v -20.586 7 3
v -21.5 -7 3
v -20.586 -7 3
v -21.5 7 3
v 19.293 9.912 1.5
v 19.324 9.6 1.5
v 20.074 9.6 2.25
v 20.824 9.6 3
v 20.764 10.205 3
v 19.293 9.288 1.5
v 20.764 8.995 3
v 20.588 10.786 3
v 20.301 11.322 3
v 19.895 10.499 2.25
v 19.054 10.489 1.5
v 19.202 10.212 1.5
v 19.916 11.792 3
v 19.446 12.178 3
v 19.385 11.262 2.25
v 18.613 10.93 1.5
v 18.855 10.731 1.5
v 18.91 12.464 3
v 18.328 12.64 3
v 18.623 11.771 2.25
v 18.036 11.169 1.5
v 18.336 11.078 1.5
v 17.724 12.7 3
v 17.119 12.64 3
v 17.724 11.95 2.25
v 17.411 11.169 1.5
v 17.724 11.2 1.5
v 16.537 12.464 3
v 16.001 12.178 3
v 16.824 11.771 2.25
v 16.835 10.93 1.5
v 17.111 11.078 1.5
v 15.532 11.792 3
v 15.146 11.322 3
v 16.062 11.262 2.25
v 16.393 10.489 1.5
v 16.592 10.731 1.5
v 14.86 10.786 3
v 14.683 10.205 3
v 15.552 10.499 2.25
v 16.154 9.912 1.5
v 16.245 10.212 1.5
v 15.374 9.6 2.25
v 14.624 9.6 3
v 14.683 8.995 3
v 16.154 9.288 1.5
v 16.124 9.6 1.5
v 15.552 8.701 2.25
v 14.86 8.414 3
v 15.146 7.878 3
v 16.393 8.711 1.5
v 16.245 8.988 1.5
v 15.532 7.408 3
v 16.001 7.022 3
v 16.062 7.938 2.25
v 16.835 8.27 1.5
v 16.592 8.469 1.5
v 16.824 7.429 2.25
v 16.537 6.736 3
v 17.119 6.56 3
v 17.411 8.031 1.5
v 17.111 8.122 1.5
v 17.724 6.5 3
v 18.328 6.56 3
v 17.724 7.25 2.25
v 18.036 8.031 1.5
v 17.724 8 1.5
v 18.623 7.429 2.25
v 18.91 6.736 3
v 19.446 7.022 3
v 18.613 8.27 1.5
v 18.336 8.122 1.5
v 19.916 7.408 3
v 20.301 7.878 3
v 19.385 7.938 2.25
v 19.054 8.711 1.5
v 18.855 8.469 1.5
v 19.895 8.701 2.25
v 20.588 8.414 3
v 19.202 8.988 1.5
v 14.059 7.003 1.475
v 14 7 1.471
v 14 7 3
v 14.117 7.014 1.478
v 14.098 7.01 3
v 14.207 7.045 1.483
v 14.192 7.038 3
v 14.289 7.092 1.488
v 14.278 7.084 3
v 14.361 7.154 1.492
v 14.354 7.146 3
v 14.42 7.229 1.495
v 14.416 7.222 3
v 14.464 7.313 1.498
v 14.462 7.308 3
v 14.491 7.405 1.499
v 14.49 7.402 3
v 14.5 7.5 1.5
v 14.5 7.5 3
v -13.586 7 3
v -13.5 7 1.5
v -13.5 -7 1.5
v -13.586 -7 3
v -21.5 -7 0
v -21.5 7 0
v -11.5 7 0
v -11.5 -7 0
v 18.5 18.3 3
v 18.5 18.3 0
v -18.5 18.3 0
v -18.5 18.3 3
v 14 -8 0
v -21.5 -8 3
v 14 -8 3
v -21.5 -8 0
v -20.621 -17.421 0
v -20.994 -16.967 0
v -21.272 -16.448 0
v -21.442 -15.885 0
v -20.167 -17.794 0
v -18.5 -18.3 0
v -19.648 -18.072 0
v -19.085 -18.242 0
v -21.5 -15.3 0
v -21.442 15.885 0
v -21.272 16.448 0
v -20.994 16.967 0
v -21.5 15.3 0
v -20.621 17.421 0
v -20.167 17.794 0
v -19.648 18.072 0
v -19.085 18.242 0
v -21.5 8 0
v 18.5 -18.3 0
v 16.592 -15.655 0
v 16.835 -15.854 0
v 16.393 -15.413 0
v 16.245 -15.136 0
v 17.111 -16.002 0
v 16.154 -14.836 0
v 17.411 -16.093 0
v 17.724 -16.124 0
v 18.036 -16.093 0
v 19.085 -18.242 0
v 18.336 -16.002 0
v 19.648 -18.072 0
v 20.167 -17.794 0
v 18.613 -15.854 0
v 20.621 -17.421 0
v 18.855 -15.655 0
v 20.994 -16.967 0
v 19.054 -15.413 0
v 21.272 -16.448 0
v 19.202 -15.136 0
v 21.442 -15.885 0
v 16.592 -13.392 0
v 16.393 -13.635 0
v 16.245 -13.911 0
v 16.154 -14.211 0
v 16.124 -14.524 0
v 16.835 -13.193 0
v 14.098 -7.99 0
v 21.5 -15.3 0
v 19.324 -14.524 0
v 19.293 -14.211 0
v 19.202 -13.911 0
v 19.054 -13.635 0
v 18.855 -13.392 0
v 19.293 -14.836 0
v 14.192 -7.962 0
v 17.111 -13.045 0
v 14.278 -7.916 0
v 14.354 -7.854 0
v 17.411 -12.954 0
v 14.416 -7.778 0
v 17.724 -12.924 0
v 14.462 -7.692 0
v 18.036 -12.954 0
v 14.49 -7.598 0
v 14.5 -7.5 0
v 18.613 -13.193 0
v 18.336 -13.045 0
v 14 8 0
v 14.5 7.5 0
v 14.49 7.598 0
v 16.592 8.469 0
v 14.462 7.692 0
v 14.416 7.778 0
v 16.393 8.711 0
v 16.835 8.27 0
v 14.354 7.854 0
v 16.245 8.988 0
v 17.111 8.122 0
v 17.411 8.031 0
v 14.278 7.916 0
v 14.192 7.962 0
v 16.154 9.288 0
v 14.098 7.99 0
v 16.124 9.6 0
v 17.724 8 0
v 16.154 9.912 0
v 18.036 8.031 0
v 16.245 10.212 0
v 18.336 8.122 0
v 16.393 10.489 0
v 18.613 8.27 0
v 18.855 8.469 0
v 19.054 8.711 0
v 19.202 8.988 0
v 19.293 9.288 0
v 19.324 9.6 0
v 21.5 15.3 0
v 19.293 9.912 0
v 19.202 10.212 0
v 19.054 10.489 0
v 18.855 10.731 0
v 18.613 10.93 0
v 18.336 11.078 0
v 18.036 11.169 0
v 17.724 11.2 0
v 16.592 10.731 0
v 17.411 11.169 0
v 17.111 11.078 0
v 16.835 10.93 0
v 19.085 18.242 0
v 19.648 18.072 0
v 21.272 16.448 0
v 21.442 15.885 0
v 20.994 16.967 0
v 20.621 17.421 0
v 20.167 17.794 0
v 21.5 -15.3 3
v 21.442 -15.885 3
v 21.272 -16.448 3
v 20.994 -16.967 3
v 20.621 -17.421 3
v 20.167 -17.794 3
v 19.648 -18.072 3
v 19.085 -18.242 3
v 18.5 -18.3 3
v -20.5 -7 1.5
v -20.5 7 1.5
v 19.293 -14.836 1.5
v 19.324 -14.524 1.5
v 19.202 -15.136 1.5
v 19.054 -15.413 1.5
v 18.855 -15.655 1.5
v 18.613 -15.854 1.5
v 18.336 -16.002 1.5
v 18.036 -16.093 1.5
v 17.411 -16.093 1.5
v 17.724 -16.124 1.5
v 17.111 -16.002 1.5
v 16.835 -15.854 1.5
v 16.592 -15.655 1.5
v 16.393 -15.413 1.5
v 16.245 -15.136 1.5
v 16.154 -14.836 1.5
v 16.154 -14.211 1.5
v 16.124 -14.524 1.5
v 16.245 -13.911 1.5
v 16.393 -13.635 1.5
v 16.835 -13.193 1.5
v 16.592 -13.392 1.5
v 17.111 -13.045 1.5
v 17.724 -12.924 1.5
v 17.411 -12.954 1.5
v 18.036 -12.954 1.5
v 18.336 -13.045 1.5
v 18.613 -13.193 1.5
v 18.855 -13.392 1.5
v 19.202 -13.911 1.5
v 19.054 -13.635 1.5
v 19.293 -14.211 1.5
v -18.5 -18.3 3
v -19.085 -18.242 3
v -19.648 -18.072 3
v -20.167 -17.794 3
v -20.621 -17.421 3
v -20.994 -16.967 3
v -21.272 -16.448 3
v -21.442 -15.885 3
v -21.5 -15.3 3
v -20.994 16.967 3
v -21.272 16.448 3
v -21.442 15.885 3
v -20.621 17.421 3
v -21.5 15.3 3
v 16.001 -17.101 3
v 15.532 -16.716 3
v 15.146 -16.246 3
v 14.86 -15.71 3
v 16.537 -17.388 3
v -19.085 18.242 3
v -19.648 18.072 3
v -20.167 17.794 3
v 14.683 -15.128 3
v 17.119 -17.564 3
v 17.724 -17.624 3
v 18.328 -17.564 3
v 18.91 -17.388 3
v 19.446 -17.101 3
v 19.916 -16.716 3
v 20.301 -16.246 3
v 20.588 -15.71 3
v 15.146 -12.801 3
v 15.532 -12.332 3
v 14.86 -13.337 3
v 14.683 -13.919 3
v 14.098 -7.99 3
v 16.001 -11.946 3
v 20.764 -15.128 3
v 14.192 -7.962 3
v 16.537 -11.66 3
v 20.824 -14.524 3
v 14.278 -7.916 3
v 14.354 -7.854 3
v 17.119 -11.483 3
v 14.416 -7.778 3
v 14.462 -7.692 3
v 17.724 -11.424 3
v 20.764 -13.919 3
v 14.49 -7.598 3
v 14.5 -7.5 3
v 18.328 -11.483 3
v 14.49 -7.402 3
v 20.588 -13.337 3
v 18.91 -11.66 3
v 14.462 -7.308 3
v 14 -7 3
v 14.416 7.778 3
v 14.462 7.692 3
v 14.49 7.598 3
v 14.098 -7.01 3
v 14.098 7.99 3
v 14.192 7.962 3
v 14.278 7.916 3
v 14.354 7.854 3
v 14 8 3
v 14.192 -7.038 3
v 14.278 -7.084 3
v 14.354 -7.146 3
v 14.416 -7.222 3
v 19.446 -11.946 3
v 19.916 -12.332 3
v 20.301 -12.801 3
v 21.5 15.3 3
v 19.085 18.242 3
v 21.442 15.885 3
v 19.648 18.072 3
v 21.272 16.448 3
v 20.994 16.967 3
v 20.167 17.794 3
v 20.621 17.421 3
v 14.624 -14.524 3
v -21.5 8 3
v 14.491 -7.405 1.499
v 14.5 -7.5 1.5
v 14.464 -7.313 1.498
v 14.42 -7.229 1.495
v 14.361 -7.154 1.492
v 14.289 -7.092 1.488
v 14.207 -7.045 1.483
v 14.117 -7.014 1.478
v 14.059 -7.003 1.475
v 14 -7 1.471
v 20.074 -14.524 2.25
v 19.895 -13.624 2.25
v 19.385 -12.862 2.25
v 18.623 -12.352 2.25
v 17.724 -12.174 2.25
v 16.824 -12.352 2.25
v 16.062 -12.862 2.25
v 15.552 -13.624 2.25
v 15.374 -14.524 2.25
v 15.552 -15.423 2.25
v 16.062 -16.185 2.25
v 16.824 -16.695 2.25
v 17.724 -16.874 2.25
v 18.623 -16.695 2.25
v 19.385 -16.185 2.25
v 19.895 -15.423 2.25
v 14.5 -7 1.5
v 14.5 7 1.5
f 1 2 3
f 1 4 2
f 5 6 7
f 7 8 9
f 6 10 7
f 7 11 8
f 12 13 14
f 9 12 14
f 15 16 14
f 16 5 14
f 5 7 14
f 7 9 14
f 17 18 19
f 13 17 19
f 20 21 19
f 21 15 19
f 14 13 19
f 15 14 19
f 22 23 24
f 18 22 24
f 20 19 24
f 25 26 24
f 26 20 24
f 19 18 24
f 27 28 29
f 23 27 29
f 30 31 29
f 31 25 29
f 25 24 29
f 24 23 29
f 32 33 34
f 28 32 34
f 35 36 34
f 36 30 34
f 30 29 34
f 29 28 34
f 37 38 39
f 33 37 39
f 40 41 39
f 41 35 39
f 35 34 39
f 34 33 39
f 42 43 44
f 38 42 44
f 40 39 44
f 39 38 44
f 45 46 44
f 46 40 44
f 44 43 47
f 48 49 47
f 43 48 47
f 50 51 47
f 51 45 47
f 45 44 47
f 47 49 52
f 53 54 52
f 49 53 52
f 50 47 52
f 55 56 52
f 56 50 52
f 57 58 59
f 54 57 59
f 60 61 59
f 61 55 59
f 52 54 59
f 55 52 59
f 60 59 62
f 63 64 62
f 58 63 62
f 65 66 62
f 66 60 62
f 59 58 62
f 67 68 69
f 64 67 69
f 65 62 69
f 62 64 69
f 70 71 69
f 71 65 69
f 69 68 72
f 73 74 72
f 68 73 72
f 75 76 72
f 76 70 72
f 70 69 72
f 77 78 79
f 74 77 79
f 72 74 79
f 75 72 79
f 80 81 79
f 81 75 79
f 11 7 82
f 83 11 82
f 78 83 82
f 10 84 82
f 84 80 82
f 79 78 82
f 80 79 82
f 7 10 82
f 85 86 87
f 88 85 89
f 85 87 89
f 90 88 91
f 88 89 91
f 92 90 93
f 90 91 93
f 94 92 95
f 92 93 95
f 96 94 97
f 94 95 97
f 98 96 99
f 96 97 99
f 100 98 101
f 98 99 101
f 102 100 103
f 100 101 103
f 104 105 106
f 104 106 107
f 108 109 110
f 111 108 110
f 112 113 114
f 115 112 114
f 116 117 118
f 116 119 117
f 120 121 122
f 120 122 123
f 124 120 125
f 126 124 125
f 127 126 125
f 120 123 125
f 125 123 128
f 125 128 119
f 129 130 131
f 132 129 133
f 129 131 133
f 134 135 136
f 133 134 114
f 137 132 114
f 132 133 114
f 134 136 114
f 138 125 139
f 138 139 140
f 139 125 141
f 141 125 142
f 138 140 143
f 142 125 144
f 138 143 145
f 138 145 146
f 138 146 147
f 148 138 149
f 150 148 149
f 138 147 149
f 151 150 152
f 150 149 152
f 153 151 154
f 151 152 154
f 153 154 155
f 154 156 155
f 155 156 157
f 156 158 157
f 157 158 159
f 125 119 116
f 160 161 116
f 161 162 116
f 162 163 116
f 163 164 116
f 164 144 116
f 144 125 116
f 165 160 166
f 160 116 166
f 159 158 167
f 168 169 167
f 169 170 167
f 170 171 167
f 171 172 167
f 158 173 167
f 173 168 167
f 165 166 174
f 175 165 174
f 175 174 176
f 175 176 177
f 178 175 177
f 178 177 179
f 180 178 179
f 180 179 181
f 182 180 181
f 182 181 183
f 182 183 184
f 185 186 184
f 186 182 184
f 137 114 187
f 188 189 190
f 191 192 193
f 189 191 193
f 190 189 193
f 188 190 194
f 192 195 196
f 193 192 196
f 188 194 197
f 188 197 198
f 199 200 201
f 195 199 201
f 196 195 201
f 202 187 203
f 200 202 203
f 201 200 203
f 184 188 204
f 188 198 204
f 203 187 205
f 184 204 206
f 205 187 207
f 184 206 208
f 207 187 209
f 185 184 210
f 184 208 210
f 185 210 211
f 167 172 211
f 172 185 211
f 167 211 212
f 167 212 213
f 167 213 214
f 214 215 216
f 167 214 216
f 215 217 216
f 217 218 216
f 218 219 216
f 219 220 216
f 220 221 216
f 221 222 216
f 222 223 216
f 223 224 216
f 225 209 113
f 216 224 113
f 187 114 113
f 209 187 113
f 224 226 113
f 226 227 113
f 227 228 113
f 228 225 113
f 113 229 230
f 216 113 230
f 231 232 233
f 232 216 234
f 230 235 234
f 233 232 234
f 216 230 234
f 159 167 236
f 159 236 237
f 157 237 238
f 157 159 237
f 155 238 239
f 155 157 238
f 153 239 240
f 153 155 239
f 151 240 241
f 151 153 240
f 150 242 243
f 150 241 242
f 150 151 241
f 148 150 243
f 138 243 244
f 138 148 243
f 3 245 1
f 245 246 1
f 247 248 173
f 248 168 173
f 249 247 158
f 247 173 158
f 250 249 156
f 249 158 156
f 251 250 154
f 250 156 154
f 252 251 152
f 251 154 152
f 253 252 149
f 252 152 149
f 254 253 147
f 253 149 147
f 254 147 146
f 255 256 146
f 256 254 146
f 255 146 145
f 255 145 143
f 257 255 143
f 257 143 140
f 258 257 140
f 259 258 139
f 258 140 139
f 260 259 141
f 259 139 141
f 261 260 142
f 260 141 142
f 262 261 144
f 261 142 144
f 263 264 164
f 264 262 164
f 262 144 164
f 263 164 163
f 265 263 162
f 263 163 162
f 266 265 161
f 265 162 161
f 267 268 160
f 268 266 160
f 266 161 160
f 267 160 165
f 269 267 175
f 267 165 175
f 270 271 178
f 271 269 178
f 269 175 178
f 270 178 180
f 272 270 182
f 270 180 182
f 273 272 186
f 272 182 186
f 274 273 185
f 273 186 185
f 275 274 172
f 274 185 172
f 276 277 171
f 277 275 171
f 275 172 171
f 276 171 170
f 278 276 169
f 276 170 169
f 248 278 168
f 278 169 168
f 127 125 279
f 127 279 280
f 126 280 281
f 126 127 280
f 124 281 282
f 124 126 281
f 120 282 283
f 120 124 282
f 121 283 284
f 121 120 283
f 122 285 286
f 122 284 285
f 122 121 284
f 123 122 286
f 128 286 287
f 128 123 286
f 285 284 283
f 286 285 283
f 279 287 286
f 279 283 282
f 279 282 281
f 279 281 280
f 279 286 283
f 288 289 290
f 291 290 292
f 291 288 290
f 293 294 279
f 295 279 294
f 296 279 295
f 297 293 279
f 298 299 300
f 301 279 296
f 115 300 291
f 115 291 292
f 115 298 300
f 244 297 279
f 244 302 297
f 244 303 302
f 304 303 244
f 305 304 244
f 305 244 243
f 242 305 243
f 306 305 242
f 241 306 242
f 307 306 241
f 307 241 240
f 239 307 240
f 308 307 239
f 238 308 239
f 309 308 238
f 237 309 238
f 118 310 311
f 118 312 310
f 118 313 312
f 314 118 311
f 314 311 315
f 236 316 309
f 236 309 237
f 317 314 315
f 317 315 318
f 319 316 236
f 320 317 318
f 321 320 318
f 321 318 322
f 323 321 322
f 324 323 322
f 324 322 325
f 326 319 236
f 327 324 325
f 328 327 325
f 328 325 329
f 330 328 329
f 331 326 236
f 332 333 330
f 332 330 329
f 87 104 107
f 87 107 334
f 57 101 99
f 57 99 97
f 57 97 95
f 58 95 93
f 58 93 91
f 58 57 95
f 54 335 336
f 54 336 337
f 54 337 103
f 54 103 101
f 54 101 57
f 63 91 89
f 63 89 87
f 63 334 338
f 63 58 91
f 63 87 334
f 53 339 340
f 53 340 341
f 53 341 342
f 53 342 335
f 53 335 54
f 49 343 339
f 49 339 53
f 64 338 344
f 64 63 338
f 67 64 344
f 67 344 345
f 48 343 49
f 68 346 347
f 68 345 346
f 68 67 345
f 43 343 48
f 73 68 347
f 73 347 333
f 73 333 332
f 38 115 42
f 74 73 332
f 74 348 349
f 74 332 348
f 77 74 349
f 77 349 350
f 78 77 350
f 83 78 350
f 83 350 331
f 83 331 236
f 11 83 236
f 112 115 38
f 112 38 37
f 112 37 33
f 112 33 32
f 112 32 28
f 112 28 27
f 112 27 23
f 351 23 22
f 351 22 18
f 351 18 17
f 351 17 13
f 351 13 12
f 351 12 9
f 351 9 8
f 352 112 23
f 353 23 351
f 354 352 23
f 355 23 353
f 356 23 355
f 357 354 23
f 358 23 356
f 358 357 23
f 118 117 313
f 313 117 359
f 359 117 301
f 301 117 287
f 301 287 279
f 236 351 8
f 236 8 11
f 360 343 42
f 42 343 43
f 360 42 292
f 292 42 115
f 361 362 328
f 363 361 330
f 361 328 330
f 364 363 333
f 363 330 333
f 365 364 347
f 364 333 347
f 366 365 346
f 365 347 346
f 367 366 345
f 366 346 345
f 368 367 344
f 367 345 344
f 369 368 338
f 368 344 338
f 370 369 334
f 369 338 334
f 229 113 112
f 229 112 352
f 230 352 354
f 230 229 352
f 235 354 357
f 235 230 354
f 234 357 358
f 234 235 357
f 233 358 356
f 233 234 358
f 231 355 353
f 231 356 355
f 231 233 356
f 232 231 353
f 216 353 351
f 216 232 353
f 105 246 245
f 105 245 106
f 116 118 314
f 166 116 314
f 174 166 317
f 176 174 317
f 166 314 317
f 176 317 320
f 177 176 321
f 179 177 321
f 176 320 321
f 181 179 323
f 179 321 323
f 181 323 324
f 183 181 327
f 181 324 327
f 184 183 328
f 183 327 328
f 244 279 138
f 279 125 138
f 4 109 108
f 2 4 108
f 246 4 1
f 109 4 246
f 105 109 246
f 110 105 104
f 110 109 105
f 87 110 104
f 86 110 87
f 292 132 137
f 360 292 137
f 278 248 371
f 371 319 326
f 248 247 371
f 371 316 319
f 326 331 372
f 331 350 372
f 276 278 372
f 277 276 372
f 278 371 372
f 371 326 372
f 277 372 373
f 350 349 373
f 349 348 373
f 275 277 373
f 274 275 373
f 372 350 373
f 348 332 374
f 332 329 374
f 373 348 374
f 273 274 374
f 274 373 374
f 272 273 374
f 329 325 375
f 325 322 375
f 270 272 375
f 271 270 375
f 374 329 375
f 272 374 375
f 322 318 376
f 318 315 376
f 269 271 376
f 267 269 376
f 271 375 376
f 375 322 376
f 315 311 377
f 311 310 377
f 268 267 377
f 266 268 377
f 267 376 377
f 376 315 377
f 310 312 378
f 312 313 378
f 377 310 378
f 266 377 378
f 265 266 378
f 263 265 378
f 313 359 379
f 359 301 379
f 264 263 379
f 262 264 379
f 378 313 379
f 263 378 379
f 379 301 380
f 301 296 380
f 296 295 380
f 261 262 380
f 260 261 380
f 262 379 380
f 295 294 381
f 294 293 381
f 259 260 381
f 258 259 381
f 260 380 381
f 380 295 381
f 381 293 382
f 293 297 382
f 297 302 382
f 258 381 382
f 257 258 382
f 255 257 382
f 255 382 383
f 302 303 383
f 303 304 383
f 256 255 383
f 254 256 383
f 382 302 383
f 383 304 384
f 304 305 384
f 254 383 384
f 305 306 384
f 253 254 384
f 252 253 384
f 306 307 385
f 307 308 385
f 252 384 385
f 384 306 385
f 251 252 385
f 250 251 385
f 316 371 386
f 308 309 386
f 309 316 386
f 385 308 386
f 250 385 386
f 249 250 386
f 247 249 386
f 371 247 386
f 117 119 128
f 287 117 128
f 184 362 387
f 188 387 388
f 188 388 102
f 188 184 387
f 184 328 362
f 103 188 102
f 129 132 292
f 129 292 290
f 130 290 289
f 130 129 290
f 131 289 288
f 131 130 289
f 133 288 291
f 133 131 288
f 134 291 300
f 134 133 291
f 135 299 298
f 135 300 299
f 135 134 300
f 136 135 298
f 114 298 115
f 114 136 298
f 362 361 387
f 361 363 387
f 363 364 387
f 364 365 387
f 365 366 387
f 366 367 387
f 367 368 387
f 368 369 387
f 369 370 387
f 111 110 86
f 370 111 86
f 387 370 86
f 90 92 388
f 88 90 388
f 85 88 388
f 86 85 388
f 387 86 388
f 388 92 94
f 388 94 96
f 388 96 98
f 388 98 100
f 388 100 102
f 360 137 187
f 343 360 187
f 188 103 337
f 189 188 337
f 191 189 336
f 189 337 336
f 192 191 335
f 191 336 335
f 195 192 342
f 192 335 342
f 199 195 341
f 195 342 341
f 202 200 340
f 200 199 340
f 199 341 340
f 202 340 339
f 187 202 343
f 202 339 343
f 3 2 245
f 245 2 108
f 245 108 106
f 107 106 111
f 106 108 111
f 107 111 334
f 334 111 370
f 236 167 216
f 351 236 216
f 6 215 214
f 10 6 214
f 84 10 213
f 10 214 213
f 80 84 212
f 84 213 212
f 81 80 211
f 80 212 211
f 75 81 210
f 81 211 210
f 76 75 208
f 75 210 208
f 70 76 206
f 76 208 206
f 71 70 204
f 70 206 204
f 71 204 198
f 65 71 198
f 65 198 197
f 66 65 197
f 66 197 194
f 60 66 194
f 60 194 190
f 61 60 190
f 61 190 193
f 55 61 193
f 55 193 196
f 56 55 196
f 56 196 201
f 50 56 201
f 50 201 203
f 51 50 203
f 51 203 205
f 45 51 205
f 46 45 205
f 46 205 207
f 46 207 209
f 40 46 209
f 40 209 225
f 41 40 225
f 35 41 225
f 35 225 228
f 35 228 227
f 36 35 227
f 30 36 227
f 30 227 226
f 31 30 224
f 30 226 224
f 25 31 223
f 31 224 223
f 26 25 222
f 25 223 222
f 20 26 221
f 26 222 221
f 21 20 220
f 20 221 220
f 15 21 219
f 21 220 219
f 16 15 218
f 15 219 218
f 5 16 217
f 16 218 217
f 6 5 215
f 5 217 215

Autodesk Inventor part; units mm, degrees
ref_plane "YZ Plane" through (0, 0, 0) normal (1, 0, 0) x (0, 1, 0)
ref_plane "XZ Plane" through (0, 0, 0) normal (0, 1, 0) x (-1, 0, 0)
ref_plane "XY Plane" through (0, 0, 0) normal (0, 0, 1) x (1, 0, 0)
sketch "Sketch1" plane through (0, 0, 0) normal (0, 0, 1) x (1, 0, 0)
  circle A0 centre (17.7236, 9.6) radius 1.6 projected
  circle A1 centre (17.7236, -14.5236) radius 1.6 projected
  line L0 (7.5226, -3.6515) -> (7.5226, 2.8) projected
  line L1 (7.5226, -3.6515) -> (9.3355, -5.4645) projected
  arc A2 (1.9766, -12.2221) -> (9.3355, -5.4645) centre (5.8, -9) ccw projected
  spline S0 degree 2 poles (1.9766, -12.2221) (-3.2, -10.4641) (-8.3766, -12.2221) knots 0.21241 0.21241 0.21241 0.78759 0.78759 0.78759 projected
  arc A3 (-15.4221, -5.1766) -> (-8.3766, -12.2221) centre (-12.2, -9) ccw projected
  spline S1 degree 2 poles (-15.4221, -5.1766) (-13.6641, 0) (-15.4221, 5.1766) knots 0.212408 0.212408 0.212408 0.787591 0.787591 0.787591 projected
  arc A4 (-8.6645, 12.5355) -> (-15.4221, 5.1766) centre (-12.2, 9) ccw projected
  line L2 (-8.6645, 12.5355) -> (-5.3142, 9.1853) projected
  arc A5 (-5.3142, 9.1853) -> (-2.6505, 9.0378) centre (-3.9, 10.5995) ccw projected
  arc A6 (-2.6505, 9.0378) -> (-2.5046, 9) centre (-2.5046, 9.3) ccw projected
  line L3 (-2.5046, 9) -> (-1.9, 9) projected
  arc A7 (3.1749, 12.6) -> (-1.9, 9) centre (7.9405, 0.505) ccw projected
  line L4 (3.1749, 12.6) -> (15.5327, 12.6) projected
  arc A8 (15.7904, 11.8941) -> (15.5327, 12.6) centre (15.5327, 12.2) ccw projected
  arc A9 (15.7904, 11.8941) -> (17.7236, 6.6) centre (17.7236, 9.6) ccw projected
  line L5 (18.5, 6.6) -> (17.7236, 6.6) projected
  line L6 (18.5, 6.6) -> (18.5, 2.8) projected
  line L7 (7.5226, 2.8) -> (18.5, 2.8) projected
  line L8 (-18.5, -18.3) -> (18.5, -18.3) projected
  arc A10 (18.5, -18.3) -> (21.5, -15.3) centre (18.5, -15.3) ccw projected
  line L9 (21.5, -15.3) -> (21.5, 15.3) projected
  arc A11 (21.5, 15.3) -> (18.5, 18.3) centre (18.5, 15.3) ccw projected
  line L10 (18.5, 18.3) -> (-18.5, 18.3) projected
  arc A12 (-18.5, 18.3) -> (-21.5, 15.3) centre (-18.5, 15.3) ccw projected
  line L11 (-21.5, 15.3) -> (-21.5, -15.3) projected
  arc A13 (-21.5, -15.3) -> (-18.5, -18.3) centre (-18.5, -15.3) ccw projected
  line L12 (-21.5, 0) -> (-21.5, -8)
  line L13 (-21.5, -8) -> (-21.5, -7)
  line L14 (-21.5, -7) -> (21.5, -7)
  line L15 (-21.5, -8) -> (21.5, -8)
  line L16 (-21.5, -7) -> (14.5, -7)
  line L17 (14.5, -8) -> (14.5, 0)
  line L18 (14.5, 0) -> (-21.5, 0)
  line L19 (-21.5, -15.3) -> (-21.5, 15.3)
  line L20 (-21.5, 7) -> (21.5, 7)
  line L21 (-21.5, 8) -> (21.5, 8)
  line L22 (14.5, 8) -> (14.5, 0)
  point P0 (0, 0)
  point P1 (10.699, -8)
  point P2 (14.5, 7)
  point P3 (10.3826, -7)
  dimension "d0" = 8
  dimension "d1" = 1
  dimension "d2" = 36
extrude "Extrusion1" add sketch "Sketch1" along normal blind 3 contours L21 A9 A8 L4 A7 L3 A6 A5 L2 A4 L11 A12 L10 A11 L9 | L21 L9 L20 A9 | L21 A4 L2 A5 A6 L3 A7 L4 A8 A9 | A9 L20 L22 L21 | L20 L9 L14 L17 L22 L7 L6 L5 A9 | A9 L5 L6 L7 L22 L20 | L22 L7 L0 L18 S1 A4 L20 | L9 L15 L17 L14 | A4 S1 L18 L11 L20 | L22 L18 L0 L7 | L9 A10 L8 A13 L11 L15 A3 S0 A2 | L14 A2 L1 L0 L18 L17 | L14 A3 S1 L18 L0 L1 A2 | S1 A3 L14 L11 L18 | A2 S0 A3 L15
chamfer "Chamfer1" distance 1.5 angle 45 2 edges at (16.1236, -14.5236, 3) (16.1236, 9.6, 3)
sketch "Sketch2" plane through (-21.5, 7, 0) normal (0, 1, 0) x (1, 0, 0)
  line L0 (36, 0) -> (36, -3) projected
  line L1 (36, 0) -> (36, -3)
  line L2 (0, -3) -> (3, -3) projected
  line L3 (36, 0) -> (0, 0)
  line L4 (0, 0) -> (0, -3)
  line L5 (0, -3) -> (36, -3)
  line L6 (36, -3) -> (36, 0)
  line L7 (0, -3) -> (7.914, -3)
  line L8 (3, -3) -> (40, -3) projected
  line L9 (0, 0) -> (0, -3) projected
  line L10 (0, -1.5) -> (8, -1.5)
  line L11 (8, -1.5) -> (7.914, -3)
  line L12 (0, 0) -> (10, 0)
  line L13 (0, 0) -> (36, 0) projected
  line L14 (10, 0) -> (36, -1.5)
  line L15 (0, -1.5) -> (1, -1.5)
  line L16 (1, -1.5) -> (0.914, -3)
  line L17 (0, -3) -> (36, -3) projected
  point P0 (21.5, 0)
  point P1 (7.914, -3)
  point P2 (0, -1.5)
  point P3 (0.914, -3)
  dimension "d8" = 7.914
  dimension "d9" = 8
  dimension "d10" = 10
  dimension "d14" = 1
extrude "Extrusion2" cut sketch "Sketch2" against normal up to surface (14 mm away) contours L0 L14 L3 | L5 L2 L16 L10 L11
fillet "Fillet1" radius 0.5 4 edges at (14.5, 8, 1.5) (14.5, 7, 2.25) (14.5, -7, 2.25) (14.5, -8, 1.5)
properties part number "test_akkum_shelki"
